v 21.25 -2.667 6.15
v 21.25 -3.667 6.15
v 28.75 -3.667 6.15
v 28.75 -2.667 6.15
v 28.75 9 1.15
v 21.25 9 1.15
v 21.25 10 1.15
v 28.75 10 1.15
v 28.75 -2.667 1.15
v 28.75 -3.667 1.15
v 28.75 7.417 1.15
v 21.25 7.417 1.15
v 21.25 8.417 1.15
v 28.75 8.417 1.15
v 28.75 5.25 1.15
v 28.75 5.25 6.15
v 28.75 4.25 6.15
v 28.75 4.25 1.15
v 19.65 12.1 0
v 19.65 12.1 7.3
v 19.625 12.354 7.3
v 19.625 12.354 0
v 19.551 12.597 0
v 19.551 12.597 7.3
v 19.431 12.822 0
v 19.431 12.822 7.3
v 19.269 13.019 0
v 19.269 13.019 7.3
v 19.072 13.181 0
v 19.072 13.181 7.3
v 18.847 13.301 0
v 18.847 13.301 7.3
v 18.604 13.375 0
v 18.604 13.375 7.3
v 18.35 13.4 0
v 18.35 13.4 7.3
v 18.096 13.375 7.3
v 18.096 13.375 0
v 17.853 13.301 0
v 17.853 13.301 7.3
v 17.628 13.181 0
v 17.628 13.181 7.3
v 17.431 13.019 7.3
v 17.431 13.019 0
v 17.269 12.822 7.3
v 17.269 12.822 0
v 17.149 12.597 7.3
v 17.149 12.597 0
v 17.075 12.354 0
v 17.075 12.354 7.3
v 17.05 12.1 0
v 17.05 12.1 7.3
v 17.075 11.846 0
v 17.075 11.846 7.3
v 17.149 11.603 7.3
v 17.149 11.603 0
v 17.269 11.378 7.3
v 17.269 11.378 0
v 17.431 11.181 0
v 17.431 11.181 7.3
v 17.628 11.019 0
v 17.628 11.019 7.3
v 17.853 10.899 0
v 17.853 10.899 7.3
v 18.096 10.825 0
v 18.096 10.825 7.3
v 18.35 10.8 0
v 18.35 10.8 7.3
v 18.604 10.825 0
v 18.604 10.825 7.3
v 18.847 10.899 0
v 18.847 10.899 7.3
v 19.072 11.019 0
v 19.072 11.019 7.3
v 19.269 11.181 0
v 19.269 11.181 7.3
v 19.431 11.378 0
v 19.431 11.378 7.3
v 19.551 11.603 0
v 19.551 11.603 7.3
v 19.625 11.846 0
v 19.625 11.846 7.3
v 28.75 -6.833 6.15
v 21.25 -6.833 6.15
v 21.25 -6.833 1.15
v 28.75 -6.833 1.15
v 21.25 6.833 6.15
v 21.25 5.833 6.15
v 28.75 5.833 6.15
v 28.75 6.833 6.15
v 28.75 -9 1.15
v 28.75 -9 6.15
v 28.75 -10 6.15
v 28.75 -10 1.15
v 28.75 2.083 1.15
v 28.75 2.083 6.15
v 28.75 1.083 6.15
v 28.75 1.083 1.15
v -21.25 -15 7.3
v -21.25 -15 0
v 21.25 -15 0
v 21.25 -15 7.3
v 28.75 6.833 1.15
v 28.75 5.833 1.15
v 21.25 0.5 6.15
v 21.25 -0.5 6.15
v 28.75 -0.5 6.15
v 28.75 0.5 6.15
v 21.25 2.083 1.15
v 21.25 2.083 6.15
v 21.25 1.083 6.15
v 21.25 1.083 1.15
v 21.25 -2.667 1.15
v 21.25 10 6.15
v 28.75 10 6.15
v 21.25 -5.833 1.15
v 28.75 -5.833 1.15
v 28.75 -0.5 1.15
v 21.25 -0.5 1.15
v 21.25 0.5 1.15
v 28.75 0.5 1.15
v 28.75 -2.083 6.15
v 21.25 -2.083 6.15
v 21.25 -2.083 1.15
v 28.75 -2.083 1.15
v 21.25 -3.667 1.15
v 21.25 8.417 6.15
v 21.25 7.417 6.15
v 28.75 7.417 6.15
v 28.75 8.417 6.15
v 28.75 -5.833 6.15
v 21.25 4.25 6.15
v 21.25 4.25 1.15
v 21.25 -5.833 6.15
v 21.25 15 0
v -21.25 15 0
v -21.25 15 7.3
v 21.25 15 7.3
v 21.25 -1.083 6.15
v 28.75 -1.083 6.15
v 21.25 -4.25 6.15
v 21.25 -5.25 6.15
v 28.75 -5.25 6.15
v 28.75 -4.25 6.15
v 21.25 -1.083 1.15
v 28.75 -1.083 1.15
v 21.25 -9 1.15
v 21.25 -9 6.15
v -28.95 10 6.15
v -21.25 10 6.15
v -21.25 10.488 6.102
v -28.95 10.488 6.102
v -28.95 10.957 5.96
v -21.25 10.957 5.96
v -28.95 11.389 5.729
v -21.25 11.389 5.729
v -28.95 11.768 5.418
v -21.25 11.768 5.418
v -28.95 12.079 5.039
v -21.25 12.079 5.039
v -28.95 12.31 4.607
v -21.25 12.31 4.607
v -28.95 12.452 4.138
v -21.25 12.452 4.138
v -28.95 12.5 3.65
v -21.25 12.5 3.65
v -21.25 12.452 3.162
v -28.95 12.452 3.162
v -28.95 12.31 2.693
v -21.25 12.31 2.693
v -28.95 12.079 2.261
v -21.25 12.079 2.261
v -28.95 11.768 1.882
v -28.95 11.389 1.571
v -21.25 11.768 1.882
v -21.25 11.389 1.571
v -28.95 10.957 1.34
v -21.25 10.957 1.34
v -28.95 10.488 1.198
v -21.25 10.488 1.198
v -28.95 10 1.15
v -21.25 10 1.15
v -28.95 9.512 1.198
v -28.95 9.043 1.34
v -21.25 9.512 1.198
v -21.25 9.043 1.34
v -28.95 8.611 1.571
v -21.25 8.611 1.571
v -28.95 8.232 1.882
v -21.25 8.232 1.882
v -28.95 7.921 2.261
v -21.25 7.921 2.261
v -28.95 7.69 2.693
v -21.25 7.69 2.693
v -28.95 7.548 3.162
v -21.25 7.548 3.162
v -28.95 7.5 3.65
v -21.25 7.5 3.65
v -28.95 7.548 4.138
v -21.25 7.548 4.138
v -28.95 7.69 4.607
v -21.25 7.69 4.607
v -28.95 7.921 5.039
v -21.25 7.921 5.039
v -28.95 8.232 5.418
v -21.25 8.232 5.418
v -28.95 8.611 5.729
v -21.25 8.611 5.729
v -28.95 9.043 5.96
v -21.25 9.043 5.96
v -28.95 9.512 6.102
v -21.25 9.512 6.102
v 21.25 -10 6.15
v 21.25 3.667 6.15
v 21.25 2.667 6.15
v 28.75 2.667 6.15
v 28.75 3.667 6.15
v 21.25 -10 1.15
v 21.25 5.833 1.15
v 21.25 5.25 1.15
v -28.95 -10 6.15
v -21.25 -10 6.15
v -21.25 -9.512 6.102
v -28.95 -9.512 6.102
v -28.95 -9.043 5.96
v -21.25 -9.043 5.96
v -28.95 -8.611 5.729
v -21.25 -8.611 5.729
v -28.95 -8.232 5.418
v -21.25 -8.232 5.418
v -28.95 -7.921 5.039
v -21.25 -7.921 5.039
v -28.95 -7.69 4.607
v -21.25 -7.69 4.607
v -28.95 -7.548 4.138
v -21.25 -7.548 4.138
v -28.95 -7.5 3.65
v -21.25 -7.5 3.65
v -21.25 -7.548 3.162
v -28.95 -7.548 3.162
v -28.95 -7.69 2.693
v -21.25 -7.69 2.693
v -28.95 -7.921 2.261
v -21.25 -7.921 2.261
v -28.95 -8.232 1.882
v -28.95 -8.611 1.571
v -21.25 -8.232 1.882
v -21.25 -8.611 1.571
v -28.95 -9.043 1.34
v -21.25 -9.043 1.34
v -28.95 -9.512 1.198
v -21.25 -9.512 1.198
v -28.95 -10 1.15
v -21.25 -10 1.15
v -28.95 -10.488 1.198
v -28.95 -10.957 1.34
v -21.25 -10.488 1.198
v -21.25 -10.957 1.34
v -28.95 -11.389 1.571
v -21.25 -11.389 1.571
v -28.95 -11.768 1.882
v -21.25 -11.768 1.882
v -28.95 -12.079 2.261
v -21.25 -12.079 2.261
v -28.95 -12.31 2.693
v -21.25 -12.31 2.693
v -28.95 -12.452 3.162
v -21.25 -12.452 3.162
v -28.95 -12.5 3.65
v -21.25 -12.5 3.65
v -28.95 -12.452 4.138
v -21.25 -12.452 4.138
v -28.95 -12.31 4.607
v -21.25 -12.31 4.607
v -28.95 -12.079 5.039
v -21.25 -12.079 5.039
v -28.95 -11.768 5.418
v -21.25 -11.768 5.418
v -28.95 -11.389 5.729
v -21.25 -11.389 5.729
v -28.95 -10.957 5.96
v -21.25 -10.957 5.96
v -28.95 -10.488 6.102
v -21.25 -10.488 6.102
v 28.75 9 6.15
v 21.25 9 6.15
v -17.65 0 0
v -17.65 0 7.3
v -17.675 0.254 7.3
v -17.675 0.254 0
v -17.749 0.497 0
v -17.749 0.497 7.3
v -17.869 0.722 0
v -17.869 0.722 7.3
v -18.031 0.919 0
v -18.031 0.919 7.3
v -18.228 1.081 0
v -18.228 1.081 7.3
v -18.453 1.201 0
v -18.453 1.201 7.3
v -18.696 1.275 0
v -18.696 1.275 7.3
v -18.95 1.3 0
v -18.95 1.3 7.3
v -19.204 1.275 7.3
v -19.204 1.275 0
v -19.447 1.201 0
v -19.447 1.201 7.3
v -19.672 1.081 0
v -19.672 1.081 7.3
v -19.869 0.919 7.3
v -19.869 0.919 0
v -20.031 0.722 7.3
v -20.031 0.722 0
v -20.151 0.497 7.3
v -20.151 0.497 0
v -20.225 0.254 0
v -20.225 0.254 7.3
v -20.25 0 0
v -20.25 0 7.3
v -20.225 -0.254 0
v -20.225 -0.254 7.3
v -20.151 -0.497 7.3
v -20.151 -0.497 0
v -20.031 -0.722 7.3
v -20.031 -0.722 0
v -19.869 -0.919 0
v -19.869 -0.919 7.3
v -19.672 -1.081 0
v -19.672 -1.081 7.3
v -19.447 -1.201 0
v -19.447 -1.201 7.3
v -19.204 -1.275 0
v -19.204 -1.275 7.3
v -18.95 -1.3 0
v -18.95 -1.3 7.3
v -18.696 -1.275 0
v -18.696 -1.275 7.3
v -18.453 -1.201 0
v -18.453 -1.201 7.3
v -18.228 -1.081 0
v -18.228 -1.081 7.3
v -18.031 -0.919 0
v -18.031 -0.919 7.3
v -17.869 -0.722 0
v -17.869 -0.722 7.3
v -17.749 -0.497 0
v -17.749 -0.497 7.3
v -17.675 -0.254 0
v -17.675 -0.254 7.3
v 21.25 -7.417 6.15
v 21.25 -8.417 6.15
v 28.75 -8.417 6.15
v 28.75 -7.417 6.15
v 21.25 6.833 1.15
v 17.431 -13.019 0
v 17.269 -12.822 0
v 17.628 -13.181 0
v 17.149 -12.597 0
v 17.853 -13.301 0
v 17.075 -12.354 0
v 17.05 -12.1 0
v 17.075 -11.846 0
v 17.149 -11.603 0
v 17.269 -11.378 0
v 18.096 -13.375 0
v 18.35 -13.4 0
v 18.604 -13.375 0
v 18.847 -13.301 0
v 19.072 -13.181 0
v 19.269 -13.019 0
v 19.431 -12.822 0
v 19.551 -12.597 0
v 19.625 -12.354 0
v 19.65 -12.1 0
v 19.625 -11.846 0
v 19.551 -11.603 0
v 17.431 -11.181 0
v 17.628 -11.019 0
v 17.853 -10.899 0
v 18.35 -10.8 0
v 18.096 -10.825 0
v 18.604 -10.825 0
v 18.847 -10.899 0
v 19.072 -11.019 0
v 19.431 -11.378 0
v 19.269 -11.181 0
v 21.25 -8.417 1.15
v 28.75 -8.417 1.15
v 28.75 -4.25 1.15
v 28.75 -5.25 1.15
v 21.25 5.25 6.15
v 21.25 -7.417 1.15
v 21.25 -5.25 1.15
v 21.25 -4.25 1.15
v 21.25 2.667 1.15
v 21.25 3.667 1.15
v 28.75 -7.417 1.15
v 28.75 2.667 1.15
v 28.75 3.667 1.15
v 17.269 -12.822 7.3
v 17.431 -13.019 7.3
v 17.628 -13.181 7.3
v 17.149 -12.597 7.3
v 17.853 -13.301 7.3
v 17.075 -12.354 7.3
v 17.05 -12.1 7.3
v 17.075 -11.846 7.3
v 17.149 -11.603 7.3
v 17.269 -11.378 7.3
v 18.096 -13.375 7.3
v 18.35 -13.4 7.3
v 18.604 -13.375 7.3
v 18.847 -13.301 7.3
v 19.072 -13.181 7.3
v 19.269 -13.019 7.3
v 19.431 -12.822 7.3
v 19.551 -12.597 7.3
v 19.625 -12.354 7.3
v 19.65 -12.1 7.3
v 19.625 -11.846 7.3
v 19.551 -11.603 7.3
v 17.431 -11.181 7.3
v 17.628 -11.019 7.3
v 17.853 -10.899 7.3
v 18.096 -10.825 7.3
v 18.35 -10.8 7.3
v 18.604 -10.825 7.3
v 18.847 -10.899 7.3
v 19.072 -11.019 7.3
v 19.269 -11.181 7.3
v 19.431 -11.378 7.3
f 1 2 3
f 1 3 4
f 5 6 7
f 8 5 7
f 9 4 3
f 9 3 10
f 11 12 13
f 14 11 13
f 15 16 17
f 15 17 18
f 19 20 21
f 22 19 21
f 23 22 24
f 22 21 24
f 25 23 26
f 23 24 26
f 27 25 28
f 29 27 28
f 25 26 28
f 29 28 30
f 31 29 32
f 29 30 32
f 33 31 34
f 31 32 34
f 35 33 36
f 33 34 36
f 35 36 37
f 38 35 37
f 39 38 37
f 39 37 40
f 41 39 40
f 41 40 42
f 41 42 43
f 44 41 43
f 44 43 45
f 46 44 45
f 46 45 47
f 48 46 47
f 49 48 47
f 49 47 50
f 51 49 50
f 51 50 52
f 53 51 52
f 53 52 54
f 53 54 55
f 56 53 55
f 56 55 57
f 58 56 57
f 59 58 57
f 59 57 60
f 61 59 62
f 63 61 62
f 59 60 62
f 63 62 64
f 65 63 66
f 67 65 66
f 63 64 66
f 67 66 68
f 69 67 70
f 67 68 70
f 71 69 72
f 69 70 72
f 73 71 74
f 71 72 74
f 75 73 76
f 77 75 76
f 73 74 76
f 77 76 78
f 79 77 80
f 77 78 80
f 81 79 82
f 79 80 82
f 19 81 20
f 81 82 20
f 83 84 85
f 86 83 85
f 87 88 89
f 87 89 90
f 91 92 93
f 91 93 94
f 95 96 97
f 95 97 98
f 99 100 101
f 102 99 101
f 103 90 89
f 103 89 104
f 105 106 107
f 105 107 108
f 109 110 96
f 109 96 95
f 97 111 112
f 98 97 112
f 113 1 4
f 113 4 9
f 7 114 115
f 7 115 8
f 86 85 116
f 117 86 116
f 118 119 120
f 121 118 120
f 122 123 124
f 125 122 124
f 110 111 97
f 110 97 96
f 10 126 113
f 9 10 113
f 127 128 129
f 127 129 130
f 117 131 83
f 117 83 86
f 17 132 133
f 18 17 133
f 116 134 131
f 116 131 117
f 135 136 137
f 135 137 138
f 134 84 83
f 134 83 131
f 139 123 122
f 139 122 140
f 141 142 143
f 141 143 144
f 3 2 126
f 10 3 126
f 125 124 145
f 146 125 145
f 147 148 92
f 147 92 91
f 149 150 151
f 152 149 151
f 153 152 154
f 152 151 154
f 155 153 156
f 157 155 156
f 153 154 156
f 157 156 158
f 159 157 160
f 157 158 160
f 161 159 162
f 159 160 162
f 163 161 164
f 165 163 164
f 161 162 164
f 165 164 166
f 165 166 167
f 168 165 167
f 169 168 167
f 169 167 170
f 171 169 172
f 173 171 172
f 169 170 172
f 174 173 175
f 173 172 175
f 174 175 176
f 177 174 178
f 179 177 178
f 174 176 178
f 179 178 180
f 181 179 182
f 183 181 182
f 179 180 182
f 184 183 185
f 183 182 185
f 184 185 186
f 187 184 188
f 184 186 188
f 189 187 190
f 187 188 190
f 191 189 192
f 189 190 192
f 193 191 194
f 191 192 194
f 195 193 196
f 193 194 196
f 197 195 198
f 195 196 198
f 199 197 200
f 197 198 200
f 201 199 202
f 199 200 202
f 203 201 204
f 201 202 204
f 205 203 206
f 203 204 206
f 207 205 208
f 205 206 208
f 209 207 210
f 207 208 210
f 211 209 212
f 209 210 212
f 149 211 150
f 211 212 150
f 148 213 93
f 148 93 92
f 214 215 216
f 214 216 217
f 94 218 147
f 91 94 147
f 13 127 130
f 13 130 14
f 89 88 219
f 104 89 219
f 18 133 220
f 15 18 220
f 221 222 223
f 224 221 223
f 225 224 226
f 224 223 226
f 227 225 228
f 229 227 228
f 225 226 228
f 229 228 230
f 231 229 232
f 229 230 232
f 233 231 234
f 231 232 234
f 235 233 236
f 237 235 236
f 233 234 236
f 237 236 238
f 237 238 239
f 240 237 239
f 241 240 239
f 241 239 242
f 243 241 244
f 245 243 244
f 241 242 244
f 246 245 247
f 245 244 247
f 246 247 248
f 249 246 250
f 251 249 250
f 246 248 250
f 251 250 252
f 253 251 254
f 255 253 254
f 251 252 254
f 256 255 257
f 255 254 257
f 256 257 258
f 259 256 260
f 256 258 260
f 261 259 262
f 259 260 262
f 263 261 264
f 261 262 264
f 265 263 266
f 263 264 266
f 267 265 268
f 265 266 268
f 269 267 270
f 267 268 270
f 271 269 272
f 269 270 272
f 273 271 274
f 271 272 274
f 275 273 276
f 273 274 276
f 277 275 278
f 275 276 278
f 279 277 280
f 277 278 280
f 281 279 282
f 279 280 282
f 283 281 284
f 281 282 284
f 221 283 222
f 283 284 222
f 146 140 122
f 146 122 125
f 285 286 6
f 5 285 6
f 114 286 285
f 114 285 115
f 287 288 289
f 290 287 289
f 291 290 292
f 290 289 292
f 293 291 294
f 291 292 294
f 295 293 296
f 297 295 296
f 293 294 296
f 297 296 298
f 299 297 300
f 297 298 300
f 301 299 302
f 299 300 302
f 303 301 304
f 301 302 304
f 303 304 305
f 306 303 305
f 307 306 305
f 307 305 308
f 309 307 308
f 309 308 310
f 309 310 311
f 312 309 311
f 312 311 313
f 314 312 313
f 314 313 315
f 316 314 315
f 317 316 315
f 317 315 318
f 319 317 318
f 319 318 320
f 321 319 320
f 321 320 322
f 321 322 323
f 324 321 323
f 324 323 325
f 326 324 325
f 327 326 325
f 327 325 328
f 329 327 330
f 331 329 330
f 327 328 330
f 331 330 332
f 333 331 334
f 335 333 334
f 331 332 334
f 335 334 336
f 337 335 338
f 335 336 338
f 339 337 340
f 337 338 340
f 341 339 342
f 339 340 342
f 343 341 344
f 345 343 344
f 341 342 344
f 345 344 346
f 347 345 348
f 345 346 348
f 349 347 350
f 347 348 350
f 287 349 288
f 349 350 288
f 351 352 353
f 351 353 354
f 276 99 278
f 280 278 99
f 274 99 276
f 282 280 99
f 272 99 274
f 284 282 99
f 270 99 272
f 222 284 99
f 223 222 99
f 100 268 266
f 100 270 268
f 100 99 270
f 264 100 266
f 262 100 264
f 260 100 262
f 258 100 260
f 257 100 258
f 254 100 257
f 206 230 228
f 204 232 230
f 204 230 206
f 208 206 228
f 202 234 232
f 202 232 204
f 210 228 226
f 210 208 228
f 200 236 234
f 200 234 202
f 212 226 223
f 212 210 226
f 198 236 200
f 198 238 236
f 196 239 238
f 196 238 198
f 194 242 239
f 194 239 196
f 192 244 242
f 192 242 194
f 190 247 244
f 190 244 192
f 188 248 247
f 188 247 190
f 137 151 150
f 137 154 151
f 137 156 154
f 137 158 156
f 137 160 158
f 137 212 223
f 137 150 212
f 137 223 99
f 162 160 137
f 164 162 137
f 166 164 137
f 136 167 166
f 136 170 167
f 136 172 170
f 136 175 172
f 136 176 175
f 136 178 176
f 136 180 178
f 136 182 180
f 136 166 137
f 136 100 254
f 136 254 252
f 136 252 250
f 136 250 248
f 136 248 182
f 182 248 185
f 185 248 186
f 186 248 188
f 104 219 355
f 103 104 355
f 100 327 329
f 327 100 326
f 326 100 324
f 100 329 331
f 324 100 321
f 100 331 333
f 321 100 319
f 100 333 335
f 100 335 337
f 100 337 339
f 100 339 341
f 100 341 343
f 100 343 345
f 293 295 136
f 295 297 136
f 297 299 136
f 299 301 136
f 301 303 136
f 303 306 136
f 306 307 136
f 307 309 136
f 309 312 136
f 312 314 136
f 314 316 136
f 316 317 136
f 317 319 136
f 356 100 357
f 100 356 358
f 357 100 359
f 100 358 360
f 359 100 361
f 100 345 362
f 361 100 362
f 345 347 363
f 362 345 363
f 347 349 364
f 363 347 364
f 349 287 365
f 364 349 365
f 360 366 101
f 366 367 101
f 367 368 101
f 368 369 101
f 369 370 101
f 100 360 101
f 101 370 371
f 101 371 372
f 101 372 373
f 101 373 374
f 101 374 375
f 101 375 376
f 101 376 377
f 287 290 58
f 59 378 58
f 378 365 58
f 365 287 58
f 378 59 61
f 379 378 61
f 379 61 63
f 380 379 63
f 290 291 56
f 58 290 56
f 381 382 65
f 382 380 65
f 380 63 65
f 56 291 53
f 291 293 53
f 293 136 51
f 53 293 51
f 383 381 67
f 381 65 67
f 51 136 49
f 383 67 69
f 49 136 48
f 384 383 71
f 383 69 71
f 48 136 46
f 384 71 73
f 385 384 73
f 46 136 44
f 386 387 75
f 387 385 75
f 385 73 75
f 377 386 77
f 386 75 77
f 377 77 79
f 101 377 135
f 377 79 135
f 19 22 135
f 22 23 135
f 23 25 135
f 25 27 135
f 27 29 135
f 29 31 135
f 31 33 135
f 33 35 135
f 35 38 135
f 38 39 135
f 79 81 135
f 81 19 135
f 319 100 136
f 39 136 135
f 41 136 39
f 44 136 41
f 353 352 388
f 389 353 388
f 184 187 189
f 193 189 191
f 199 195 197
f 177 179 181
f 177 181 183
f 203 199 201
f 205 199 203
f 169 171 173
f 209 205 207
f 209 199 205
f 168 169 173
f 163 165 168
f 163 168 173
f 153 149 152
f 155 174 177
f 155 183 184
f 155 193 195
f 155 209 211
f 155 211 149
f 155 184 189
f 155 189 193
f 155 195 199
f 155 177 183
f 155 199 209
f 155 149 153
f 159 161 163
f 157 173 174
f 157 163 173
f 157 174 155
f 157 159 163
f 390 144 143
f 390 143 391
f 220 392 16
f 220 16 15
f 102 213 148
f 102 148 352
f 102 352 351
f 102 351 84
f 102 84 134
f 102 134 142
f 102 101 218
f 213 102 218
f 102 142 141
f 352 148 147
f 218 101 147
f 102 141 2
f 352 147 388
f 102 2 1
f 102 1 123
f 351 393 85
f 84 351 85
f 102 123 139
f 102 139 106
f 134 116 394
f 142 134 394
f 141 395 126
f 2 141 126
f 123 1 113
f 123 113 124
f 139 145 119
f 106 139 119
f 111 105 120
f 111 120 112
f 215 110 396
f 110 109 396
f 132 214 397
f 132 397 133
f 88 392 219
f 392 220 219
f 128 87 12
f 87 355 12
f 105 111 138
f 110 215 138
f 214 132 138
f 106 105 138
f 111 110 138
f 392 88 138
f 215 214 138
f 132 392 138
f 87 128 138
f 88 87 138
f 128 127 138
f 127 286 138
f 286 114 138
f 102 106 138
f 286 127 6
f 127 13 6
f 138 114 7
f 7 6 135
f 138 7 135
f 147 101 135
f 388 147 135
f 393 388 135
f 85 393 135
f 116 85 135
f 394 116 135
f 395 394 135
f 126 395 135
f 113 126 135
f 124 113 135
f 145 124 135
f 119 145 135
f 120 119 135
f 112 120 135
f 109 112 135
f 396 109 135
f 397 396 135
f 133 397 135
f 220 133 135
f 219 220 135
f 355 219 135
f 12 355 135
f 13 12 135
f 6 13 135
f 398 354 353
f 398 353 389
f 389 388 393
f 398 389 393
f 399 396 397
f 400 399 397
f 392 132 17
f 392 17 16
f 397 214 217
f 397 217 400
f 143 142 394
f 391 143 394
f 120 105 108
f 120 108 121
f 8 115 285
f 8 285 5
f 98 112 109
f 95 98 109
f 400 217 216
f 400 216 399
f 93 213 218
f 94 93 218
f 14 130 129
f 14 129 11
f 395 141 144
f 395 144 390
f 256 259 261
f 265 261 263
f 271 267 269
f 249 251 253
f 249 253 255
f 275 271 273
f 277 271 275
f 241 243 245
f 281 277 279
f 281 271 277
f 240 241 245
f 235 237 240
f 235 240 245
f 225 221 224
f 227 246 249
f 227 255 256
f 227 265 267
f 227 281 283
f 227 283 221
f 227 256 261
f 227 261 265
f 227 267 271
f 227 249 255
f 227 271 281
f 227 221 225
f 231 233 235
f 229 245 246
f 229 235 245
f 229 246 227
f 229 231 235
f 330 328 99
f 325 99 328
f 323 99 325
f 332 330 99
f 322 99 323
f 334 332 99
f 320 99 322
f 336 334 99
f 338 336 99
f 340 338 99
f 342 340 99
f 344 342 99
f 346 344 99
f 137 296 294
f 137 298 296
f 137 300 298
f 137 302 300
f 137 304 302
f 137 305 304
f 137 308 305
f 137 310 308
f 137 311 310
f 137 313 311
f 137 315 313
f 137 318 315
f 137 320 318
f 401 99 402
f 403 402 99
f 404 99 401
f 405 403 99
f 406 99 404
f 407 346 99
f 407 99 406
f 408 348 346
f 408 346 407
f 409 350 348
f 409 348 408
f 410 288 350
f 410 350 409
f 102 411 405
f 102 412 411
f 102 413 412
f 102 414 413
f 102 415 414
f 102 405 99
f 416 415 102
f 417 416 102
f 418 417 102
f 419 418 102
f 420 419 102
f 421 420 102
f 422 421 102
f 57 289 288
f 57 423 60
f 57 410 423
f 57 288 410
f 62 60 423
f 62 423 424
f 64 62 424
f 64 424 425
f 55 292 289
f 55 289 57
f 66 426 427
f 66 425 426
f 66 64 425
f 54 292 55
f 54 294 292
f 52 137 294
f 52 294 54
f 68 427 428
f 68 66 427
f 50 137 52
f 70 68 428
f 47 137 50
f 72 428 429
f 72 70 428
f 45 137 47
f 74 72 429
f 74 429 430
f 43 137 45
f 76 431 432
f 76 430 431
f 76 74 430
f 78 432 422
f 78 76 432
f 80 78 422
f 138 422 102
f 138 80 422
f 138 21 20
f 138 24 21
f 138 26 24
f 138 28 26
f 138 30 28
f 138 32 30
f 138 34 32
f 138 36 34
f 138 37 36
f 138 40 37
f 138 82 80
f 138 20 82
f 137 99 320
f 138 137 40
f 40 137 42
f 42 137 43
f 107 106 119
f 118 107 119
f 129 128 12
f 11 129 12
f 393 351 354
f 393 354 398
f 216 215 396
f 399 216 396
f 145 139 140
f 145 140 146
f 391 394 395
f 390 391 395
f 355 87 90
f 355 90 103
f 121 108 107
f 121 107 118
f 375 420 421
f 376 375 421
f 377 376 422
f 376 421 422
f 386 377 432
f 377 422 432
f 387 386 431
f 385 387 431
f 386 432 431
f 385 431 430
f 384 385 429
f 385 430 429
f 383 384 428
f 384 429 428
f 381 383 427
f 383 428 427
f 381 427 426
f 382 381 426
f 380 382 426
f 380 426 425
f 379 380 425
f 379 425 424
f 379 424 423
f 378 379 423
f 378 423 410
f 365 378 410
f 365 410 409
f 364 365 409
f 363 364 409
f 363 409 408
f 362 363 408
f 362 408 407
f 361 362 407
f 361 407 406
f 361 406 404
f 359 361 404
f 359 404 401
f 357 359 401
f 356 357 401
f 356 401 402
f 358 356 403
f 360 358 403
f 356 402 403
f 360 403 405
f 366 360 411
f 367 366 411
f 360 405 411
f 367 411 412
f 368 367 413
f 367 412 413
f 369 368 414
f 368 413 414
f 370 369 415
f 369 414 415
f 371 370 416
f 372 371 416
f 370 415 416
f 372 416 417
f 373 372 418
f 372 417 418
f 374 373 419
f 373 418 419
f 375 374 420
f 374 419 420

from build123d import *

# Parameters (mm, degrees)
SKETCH1_W           = 42.5
SKETCH1_H           = 30
BOSS_EXTRUDE1_DEPTH = 7.3
CUT_EXTRUDE1_REACH  = 9.3
SKETCH2_R           = 1.3
SKETCH3_R           = 2.5
BOSS_EXTRUDE2_DEPTH = 7.7
SKETCH4_W           = 5
SKETCH4_H           = 1
BOSS_EXTRUDE3_DEPTH = 7.5


with BuildPart() as part:
    # Sketch1 → Boss-Extrude1 (new body)
    with BuildSketch(Plane.XY):
        Rectangle(SKETCH1_W, SKETCH1_H)
    extrude(amount=BOSS_EXTRUDE1_DEPTH)

    # Sketch2 → Cut-Extrude1 (cut, up to next)
    with BuildSketch(Plane.XY.offset(7.3), mode=Mode.PRIVATE) as cut_extrude1_sk1:
        with Locations((18.35, -12.1)):
            Circle(SKETCH2_R)
    cut_extrude1_tool1 = extrude(cut_extrude1_sk1.sketch, amount=-CUT_EXTRUDE1_REACH, mode=Mode.PRIVATE) & part.part
    add(cut_extrude1_tool1.solids().sort_by_distance((18.35, -12.1, 7.3))[0], mode=Mode.SUBTRACT)
    # Sketch2 → Cut-Extrude1 (cut, up to next)
    with BuildSketch(Plane.XY.offset(7.3), mode=Mode.PRIVATE) as cut_extrude1_sk2:
        with Locations((18.35, 12.1)):
            Circle(SKETCH2_R)
    cut_extrude1_tool2 = extrude(cut_extrude1_sk2.sketch, amount=-CUT_EXTRUDE1_REACH, mode=Mode.PRIVATE) & part.part
    add(cut_extrude1_tool2.solids().sort_by_distance((18.35, 12.1, 7.3))[0], mode=Mode.SUBTRACT)
    # Sketch2 → Cut-Extrude1 (cut, up to next)
    with BuildSketch(Plane.XY.offset(7.3), mode=Mode.PRIVATE) as cut_extrude1_sk3:
        with Locations((-18.95, 0)):
            Circle(SKETCH2_R)
    cut_extrude1_tool3 = extrude(cut_extrude1_sk3.sketch, amount=-CUT_EXTRUDE1_REACH, mode=Mode.PRIVATE) & part.part
    add(cut_extrude1_tool3.solids().sort_by_distance((-18.95, 0, 7.3))[0], mode=Mode.SUBTRACT)

    # Sketch3 → Boss-Extrude2 (add)
    with BuildSketch(Plane.ZY.offset(21.25)):
        with Locations((3.65, 10)):
            Circle(SKETCH3_R)
        with Locations((3.65, -10)):
            Circle(SKETCH3_R)
    extrude(amount=BOSS_EXTRUDE2_DEPTH)

    # Sketch4 → Boss-Extrude3 (add)
    with BuildSketch(Plane(origin=(21.25, 0, 0), x_dir=(0, 0, -1), z_dir=(1, 0, 0))):
        with Locations((-3.65, 9.5)):
            Rectangle(SKETCH4_W, SKETCH4_H)
        with Locations((-3.65, 7.916666667)):
            Rectangle(SKETCH4_W, SKETCH4_H)
        with Locations((-3.65, 6.333333333)):
            Rectangle(SKETCH4_W, SKETCH4_H)
        with Locations((-3.65, 4.75)):
            Rectangle(SKETCH4_W, SKETCH4_H)
        with Locations((-3.65, 3.166666667)):
            Rectangle(SKETCH4_W, SKETCH4_H)
        with Locations((-3.65, 1.583333333)):
            Rectangle(SKETCH4_W, SKETCH4_H)
        with Locations((-3.65, 0)):
            Rectangle(SKETCH4_W, SKETCH4_H)
        with Locations((-3.65, -1.583333333)):
            Rectangle(SKETCH4_W, SKETCH4_H)
        with Locations((-3.65, -3.166666667)):
            Rectangle(SKETCH4_W, SKETCH4_H)
        with Locations((-3.65, -4.75)):
            Rectangle(SKETCH4_W, SKETCH4_H)
        with Locations((-3.65, -6.333333333)):
            Rectangle(SKETCH4_W, SKETCH4_H)
        with Locations((-3.65, -7.916666667)):
            Rectangle(SKETCH4_W, SKETCH4_H)
        with Locations((-3.65, -9.5)):
            Rectangle(SKETCH4_W, SKETCH4_H)
    extrude(amount=BOSS_EXTRUDE3_DEPTH)


solid = part.part
